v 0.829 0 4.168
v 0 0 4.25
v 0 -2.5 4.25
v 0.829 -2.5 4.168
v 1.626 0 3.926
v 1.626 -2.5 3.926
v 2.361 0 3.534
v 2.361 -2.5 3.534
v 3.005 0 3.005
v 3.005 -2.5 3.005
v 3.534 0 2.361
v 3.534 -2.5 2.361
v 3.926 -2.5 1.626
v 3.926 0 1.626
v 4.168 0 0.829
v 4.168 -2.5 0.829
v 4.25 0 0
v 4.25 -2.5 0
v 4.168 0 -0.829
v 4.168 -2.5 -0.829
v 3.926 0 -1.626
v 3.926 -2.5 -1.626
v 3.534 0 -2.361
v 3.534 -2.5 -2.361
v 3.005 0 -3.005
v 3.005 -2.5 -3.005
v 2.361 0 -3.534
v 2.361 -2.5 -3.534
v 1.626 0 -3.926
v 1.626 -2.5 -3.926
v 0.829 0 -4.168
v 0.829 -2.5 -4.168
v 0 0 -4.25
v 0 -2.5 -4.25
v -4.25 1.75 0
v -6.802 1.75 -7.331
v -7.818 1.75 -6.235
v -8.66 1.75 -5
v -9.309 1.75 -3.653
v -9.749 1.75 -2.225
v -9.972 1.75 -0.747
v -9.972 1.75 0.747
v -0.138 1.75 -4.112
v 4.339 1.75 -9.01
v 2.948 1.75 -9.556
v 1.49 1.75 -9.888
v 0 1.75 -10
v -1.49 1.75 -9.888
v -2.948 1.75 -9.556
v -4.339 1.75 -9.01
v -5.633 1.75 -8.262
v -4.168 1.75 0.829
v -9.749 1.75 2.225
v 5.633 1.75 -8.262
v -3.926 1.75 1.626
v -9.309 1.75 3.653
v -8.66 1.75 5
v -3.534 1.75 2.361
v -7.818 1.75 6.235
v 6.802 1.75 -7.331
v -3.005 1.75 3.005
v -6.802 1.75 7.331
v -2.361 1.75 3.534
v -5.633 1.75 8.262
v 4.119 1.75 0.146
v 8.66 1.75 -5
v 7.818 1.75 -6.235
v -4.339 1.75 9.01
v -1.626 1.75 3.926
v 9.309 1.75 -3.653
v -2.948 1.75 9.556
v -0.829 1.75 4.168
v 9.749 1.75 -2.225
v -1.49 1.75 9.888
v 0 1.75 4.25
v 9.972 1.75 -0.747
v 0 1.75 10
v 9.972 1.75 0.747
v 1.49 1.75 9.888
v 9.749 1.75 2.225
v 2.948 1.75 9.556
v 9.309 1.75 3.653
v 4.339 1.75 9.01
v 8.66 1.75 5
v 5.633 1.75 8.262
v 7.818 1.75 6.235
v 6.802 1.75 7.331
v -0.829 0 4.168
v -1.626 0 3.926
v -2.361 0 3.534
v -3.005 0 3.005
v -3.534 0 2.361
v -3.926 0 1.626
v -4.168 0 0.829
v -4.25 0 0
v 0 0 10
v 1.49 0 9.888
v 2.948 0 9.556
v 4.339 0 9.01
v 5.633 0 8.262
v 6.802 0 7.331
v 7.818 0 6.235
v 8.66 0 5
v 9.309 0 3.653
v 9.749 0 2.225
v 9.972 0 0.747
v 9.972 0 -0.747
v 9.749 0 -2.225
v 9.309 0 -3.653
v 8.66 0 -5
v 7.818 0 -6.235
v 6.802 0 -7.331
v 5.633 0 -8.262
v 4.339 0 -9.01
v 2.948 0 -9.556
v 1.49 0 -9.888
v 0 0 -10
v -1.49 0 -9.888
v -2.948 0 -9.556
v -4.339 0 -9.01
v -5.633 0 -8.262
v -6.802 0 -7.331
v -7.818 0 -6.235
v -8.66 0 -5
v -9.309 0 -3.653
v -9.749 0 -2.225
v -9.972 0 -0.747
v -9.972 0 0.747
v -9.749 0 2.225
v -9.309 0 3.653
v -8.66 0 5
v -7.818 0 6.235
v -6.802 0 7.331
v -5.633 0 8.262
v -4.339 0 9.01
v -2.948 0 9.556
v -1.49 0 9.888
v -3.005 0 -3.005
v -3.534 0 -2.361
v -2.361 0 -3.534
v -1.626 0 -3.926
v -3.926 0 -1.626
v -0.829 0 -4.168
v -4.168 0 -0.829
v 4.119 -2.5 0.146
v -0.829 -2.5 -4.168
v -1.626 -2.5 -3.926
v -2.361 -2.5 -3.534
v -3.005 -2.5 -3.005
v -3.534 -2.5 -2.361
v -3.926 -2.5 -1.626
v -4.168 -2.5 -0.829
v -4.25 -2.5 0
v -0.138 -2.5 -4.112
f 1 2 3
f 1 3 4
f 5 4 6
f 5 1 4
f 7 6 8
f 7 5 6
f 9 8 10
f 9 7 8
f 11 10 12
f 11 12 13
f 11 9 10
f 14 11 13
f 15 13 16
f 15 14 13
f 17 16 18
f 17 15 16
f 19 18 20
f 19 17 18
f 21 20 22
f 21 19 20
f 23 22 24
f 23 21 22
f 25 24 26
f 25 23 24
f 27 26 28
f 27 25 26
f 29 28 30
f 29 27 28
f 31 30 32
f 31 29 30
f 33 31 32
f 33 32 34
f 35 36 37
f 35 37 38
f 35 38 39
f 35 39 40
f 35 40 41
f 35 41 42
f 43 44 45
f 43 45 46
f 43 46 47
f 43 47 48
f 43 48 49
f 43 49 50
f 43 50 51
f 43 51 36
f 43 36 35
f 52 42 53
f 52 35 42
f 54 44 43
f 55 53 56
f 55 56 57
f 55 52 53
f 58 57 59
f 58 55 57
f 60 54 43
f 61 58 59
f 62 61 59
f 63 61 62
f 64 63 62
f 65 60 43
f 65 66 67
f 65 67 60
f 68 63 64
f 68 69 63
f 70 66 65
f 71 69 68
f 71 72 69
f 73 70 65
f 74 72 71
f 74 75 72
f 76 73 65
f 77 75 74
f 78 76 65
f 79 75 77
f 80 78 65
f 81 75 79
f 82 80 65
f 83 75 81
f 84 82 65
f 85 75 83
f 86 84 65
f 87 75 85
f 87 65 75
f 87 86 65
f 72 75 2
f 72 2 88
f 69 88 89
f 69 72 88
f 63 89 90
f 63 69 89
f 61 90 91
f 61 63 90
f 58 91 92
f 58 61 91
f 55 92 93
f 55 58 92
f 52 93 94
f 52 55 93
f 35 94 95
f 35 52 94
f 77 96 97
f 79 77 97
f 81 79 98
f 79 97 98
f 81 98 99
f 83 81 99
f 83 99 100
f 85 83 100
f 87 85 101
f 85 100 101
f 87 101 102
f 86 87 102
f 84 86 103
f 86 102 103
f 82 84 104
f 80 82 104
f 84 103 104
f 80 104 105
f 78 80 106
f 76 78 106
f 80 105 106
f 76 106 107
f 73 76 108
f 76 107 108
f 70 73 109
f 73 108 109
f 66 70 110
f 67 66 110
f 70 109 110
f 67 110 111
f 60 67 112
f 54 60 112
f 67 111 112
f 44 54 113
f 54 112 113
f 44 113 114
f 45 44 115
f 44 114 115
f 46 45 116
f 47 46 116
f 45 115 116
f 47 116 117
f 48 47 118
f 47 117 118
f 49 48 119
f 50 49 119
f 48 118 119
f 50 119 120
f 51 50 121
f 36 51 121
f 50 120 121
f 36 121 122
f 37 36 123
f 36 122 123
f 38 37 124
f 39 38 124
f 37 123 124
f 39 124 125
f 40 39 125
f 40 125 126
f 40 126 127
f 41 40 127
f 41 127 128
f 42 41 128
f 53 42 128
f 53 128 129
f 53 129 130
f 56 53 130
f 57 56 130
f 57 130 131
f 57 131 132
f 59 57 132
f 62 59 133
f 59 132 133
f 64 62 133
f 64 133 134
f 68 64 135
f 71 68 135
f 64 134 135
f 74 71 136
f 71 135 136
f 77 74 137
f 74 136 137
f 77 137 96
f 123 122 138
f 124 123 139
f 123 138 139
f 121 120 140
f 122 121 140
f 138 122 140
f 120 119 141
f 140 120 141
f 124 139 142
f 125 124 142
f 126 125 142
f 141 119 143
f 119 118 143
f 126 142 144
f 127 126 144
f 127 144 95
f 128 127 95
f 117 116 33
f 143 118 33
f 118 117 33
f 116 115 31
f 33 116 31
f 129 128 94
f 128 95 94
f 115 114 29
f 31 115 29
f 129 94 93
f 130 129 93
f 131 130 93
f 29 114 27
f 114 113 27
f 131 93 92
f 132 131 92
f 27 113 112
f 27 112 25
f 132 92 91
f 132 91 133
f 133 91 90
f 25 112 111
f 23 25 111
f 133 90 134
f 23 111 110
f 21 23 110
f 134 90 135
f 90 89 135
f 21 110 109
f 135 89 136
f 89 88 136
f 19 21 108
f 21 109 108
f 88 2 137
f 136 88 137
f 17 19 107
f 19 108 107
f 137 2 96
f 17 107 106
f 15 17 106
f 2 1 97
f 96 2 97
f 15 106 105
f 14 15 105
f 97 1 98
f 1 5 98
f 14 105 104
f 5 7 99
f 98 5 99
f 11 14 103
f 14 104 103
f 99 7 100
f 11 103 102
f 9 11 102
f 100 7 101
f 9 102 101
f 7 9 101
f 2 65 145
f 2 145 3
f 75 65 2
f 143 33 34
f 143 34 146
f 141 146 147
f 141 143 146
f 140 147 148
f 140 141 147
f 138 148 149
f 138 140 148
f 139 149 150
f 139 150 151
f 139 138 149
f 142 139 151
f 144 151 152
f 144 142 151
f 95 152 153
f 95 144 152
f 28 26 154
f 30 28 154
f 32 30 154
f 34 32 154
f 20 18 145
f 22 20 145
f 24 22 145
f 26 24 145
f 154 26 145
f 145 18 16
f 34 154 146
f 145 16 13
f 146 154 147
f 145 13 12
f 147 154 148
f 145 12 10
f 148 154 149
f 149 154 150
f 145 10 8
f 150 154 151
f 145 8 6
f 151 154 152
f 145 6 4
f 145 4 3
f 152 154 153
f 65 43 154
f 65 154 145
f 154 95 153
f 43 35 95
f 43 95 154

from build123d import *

# Parameters (mm, degrees)
SKETCH2_R           = 10
BOSS_EXTRUDE1_DEPTH = 1.75
BOSS_EXTRUDE2_DEPTH = 2.5
CUT_EXTRUDE1_START  = -2.5
CUT_EXTRUDE1_DEPTH  = 2.5


with BuildPart() as part:
    # Sketch2 → Boss-Extrude1 (new body)
    with BuildSketch(Plane(origin=(0, 0, 0), x_dir=(1, 0, 0), z_dir=(0, 1, 0))):
        with Locations(Location((0, 0, 0), (0, 0, 270))):
            Circle(SKETCH2_R)
    extrude(amount=BOSS_EXTRUDE1_DEPTH)

    # Sketch3 → Boss-Extrude2 (add)
    with BuildSketch(Plane.XZ):
        with BuildLine():
            Line((-4.25, 0), (-0.138270177, -4.111729823))
            Line((-0.138270177, -4.111729823), (4.119266685, 0.145807039))
            Line((4.119266685, 0.145807039), (0, 4.25))
            ThreePointArc((0, 4.25), (4.25, 0), (0, -4.25))
            ThreePointArc((0, -4.25), (-3.00520382, -3.00520382), (-4.25, 0))
        make_face()
    extrude(amount=BOSS_EXTRUDE2_DEPTH)

    # Sketch4 → Cut-Extrude1 (cut)
    with BuildSketch(Plane.XZ.offset(CUT_EXTRUDE1_START)):
        with BuildLine():
            Line((-0.138270177, -4.111729823), (4.119266685, 0.145807039))
            Line((4.119266685, 0.145807039), (0, 4.25))
            ThreePointArc((0, 4.25), (-3.00520382, 3.00520382), (-4.25, 0))
            Line((-4.25, 0), (-0.138270177, -4.111729823))
        make_face()
    extrude(amount=CUT_EXTRUDE1_DEPTH, mode=Mode.SUBTRACT)


solid = part.part
